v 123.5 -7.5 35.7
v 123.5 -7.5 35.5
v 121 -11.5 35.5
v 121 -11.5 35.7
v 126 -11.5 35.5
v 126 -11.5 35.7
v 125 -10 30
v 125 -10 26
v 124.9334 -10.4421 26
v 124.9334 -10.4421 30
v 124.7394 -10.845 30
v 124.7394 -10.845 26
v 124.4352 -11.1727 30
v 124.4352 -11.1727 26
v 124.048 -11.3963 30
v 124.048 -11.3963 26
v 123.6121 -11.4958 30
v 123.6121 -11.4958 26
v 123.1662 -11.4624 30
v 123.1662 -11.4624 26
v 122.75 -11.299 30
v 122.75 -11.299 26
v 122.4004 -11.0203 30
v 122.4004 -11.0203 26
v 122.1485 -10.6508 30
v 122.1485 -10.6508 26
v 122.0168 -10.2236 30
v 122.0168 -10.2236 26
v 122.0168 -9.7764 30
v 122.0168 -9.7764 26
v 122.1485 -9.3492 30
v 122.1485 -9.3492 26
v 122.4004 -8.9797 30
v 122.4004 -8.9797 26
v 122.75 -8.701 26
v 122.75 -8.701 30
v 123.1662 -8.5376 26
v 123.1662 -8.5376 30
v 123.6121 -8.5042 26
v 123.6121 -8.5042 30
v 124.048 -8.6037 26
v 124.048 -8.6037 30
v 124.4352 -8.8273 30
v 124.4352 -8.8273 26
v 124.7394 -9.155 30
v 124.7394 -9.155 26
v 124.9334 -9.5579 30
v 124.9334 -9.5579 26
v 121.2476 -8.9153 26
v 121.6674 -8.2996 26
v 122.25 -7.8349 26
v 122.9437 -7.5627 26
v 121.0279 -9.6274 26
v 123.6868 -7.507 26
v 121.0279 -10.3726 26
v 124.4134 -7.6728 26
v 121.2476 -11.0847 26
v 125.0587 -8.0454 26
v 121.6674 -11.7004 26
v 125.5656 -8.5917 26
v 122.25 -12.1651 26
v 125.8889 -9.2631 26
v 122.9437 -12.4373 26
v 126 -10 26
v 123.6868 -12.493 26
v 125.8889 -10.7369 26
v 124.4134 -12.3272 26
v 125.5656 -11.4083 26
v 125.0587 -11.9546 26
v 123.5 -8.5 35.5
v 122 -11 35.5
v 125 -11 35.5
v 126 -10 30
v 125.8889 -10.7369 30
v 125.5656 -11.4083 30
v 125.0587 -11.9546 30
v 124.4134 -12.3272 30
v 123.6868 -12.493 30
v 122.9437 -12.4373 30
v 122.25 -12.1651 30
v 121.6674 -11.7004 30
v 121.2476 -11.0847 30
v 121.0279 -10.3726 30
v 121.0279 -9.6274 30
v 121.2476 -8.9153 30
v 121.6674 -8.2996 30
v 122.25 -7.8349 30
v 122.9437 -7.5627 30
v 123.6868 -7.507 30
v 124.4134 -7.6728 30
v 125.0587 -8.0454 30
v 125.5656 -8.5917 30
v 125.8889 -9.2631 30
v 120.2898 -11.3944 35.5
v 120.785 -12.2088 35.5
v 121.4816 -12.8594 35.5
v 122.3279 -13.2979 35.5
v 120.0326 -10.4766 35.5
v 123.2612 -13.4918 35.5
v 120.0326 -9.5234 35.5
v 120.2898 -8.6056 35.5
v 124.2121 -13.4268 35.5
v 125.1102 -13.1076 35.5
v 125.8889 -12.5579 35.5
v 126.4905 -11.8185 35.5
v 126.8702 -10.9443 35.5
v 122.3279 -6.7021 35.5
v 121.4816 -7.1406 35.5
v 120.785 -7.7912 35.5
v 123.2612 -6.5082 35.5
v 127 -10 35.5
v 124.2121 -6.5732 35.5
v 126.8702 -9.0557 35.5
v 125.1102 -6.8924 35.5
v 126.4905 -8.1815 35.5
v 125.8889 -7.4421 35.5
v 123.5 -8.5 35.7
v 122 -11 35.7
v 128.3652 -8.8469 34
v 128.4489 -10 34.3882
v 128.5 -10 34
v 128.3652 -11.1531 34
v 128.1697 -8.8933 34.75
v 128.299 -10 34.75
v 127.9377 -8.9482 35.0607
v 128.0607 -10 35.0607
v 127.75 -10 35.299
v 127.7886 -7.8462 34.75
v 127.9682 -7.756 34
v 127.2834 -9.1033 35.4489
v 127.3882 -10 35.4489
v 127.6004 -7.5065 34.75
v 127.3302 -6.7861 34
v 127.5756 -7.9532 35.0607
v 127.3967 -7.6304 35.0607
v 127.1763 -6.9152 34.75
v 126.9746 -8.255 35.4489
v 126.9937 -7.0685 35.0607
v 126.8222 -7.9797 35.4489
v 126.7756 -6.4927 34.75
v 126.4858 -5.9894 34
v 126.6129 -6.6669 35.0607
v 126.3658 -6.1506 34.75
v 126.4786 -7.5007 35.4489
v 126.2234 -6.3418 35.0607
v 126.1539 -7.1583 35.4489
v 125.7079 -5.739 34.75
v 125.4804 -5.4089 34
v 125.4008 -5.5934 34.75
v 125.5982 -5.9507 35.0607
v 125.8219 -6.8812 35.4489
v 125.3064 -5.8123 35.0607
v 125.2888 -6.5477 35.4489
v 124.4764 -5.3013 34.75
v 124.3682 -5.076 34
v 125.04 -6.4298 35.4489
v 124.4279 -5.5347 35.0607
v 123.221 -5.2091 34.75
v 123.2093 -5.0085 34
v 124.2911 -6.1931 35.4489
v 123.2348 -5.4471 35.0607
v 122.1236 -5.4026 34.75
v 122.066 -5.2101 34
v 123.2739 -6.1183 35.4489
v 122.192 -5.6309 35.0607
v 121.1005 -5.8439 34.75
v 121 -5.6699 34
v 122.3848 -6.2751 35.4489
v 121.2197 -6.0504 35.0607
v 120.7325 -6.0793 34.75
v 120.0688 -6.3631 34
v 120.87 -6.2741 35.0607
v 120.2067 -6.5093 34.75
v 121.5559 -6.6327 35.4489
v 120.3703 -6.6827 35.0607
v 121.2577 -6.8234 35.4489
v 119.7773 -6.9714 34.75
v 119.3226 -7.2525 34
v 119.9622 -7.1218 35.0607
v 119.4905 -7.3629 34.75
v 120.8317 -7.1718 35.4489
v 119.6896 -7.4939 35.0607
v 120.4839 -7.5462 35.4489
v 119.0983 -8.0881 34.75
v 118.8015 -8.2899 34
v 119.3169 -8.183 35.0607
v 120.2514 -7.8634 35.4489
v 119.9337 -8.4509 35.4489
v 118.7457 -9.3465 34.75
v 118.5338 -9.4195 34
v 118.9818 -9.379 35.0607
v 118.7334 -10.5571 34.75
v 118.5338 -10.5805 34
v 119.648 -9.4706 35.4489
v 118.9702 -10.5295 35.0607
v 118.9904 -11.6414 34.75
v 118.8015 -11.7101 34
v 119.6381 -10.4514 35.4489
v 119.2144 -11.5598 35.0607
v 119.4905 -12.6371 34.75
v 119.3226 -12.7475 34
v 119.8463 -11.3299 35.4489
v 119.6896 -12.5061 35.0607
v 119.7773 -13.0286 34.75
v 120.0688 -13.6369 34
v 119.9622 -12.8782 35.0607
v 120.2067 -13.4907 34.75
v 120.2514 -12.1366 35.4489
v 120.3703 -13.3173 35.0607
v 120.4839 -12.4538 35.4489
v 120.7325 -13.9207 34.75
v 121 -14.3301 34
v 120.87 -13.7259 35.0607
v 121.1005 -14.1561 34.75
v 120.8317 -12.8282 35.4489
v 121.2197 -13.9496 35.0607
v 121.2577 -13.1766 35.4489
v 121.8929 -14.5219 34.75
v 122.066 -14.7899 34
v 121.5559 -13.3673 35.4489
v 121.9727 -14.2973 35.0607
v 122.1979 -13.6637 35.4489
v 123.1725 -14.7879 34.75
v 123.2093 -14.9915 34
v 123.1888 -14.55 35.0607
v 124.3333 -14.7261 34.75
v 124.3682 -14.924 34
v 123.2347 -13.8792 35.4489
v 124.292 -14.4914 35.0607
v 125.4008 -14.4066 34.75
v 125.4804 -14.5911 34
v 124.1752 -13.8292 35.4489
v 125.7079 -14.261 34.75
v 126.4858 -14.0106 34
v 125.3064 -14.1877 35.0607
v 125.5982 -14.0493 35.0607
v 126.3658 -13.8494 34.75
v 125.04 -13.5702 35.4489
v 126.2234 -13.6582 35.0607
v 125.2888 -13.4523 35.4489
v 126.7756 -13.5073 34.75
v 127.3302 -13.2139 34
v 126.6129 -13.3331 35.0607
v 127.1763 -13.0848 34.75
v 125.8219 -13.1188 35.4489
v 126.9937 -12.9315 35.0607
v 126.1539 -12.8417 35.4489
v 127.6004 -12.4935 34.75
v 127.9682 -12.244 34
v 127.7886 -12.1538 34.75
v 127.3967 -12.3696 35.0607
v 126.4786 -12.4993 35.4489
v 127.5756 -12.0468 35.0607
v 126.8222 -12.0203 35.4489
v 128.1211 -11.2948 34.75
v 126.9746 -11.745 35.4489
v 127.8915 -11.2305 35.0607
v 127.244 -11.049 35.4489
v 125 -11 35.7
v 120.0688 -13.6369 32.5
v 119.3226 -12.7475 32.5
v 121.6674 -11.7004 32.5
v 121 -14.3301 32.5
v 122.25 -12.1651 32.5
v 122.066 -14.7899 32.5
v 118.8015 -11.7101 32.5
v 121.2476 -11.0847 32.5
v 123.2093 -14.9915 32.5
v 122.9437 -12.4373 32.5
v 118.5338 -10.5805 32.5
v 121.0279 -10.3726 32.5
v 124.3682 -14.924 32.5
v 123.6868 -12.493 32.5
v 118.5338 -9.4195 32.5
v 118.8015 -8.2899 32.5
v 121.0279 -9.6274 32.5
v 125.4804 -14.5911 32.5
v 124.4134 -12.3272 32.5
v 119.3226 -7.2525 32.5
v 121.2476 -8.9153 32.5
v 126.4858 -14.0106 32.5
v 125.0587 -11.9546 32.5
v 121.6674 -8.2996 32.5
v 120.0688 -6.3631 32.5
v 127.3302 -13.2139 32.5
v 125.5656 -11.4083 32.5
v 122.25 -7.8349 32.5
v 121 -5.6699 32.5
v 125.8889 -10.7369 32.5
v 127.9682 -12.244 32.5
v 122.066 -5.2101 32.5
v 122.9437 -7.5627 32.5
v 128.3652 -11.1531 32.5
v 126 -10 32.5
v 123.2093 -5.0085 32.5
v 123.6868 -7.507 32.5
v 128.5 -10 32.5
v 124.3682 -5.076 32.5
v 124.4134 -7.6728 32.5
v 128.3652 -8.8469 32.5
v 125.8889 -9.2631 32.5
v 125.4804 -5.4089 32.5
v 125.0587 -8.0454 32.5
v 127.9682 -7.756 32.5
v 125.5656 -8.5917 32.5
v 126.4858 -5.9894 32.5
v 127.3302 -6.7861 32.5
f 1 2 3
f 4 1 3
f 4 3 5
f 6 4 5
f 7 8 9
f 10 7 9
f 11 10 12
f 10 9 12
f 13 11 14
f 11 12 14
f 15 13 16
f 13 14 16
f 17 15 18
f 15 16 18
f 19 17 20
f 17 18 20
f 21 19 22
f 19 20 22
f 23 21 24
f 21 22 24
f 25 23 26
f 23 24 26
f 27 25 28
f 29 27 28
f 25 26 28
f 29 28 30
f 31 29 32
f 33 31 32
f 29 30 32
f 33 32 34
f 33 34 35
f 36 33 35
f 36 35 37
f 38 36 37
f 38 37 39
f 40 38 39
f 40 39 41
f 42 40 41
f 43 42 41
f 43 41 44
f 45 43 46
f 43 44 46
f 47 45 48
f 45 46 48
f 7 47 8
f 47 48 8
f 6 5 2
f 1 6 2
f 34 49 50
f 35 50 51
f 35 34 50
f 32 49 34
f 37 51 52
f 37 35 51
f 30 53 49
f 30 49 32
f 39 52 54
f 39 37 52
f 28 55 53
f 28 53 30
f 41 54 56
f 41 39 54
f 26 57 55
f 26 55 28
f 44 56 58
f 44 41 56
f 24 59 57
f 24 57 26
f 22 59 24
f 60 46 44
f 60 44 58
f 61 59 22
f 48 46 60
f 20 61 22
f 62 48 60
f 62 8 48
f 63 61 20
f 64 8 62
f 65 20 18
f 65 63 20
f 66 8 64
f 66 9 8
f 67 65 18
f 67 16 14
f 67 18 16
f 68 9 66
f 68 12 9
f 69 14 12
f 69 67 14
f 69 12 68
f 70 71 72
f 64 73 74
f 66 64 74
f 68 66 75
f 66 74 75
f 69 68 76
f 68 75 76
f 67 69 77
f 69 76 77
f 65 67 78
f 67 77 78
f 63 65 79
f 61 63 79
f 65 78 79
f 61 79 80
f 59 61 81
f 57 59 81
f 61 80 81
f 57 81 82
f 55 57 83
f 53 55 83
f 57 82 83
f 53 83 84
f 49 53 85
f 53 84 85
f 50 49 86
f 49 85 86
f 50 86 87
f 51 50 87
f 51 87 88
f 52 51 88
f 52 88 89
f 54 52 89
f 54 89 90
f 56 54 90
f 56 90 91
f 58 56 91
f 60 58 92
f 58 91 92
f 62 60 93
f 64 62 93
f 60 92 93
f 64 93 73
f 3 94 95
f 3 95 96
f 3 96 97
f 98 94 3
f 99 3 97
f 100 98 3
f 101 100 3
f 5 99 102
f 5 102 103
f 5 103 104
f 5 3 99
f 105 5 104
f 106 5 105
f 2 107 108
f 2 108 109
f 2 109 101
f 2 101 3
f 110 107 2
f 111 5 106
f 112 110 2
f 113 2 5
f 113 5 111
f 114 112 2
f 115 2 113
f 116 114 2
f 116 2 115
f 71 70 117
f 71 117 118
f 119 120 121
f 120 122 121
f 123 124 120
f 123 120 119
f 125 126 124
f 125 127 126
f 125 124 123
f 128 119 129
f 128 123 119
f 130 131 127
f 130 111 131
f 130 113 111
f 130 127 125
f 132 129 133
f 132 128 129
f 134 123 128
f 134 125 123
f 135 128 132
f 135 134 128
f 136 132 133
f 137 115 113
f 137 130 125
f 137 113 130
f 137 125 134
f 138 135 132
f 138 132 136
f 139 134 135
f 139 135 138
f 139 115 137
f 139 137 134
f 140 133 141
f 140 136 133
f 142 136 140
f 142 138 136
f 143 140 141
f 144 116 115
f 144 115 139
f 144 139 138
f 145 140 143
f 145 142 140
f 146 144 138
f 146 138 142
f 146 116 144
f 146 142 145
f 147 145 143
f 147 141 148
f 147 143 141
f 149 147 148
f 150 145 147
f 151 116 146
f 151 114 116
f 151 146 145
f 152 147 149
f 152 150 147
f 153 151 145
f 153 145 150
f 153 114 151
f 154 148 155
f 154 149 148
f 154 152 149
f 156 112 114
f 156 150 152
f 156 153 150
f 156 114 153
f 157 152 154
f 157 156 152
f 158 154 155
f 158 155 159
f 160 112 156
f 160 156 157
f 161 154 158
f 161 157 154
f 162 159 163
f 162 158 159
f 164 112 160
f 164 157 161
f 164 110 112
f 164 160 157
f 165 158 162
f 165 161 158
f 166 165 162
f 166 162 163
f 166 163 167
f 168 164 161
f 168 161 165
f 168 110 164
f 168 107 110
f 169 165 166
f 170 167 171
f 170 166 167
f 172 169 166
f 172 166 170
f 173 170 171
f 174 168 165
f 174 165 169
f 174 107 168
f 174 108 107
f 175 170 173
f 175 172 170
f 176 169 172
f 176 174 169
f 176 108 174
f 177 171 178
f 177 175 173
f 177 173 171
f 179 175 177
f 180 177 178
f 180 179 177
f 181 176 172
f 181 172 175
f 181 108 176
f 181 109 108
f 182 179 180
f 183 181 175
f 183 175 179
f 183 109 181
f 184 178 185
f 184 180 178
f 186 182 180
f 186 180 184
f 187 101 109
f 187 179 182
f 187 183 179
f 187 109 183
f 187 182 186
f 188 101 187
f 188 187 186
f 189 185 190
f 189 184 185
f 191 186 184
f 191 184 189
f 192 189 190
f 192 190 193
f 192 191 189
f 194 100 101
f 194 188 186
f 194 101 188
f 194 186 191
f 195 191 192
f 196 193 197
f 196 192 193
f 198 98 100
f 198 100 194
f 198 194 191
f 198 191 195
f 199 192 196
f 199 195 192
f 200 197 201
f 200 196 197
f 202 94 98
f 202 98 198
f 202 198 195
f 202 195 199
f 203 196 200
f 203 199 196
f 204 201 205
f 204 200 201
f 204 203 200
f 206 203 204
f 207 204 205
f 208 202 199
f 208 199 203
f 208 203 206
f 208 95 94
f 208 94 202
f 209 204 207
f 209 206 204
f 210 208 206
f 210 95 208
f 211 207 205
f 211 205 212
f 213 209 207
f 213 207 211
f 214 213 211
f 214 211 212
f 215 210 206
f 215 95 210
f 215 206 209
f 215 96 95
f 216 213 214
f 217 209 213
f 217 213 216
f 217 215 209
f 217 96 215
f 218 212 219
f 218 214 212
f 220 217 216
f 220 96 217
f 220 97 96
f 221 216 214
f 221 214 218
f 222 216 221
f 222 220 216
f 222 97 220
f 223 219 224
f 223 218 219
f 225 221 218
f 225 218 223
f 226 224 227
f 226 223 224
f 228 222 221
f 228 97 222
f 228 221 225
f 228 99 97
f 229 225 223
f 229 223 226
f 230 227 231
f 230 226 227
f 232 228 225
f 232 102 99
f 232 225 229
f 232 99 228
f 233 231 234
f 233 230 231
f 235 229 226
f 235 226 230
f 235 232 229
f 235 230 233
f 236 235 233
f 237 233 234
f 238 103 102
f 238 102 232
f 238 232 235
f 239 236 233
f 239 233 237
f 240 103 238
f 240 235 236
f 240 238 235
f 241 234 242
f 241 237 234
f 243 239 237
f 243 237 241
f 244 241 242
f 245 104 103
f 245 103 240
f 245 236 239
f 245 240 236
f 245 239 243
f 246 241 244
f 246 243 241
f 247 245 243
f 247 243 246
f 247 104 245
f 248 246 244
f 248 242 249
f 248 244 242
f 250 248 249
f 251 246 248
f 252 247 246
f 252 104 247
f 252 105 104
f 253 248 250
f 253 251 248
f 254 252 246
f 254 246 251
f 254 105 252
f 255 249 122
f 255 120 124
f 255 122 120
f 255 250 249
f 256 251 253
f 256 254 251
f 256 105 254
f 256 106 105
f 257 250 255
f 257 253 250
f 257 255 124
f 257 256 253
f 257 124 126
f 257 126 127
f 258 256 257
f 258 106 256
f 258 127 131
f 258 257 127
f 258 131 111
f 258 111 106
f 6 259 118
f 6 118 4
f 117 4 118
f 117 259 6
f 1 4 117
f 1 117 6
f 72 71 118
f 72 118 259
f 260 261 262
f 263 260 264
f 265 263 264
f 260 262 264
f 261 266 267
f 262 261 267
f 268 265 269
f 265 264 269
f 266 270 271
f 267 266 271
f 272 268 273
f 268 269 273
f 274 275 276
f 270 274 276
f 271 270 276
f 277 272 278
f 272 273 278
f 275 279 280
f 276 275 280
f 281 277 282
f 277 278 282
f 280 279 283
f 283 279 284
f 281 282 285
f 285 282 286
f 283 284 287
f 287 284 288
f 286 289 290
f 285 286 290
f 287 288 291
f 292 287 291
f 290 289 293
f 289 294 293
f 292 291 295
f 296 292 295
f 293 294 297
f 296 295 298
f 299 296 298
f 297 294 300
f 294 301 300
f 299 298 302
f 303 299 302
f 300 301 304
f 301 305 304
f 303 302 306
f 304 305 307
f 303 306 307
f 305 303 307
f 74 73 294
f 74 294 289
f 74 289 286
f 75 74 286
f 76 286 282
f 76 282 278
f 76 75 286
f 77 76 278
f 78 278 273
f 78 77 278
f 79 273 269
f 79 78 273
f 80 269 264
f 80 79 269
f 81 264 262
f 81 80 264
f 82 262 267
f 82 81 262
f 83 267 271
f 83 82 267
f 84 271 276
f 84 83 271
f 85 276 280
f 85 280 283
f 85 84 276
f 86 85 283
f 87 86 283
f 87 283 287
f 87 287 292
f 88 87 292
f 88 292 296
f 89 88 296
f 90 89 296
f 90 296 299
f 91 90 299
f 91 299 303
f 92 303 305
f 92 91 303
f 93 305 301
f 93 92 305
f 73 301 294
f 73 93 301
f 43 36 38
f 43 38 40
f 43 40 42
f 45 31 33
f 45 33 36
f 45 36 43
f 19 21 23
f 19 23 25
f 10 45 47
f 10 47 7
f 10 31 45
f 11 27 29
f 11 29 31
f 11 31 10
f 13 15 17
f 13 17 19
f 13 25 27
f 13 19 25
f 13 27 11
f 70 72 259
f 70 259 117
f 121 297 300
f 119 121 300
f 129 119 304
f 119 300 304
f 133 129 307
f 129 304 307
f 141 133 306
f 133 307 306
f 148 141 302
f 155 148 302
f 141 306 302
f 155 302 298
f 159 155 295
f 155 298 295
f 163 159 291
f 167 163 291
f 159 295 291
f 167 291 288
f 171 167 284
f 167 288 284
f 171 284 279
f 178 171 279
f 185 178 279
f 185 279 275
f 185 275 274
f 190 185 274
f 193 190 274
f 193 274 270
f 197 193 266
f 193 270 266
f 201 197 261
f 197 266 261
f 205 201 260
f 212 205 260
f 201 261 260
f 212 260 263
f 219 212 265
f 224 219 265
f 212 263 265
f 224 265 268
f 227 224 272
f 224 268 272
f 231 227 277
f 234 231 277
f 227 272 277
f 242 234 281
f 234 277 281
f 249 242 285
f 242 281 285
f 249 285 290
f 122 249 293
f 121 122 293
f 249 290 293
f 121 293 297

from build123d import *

# Parameters (mm, degrees)
SKETCH046_R     = 2.5
PAD023_DEPTH    = 2.5
SKETCH047_R     = 5
PAD024_DEPTH    = 3
FILLET003_R     = 1.5
SKETCH049_R     = 2.5
PAD025_DEPTH    = 4
SKETCH050_R     = 1.5
POCKET026_DEPTH = 4
PAD056_DEPTH    = 0.2


with BuildPart() as part:
    # Sketch046 → Pad023 (new body)
    with BuildSketch(Plane(origin=(0, 0, 30), x_dir=(1, 0, 0), z_dir=(0, 0, -1))):
        with Locations((101, 55)):
            Circle(SKETCH046_R)
    extrude(amount=-PAD023_DEPTH)

    # Sketch047 (on Face3 of Pad023) → Pad024 (join)
    with BuildSketch(Plane.XY.offset(32.5)):
        with Locations((101, -55)):
            Circle(SKETCH047_R)
    extrude(amount=PAD024_DEPTH)

    # Fillet003
    fillet003_edges = [part.edges().sort_by_distance(p)[0] for p in [
        (96, -55, 35.5),
    ]]
    fillet(fillet003_edges, radius=FILLET003_R)

    # Sketch049 → Pad025 (join)
    with BuildSketch(Plane(origin=(0, 0, 30), x_dir=(1, 0, 0), z_dir=(0, 0, -1))):
        with Locations((101, 55)):
            Circle(SKETCH049_R)
    extrude(amount=PAD025_DEPTH)

    # Sketch050 (on Face17 of Pad025) → Pocket026 (cut)
    with BuildSketch(Plane(origin=(0, 0, 26), x_dir=(1, 0, 0), z_dir=(0, 0, -1))):
        with Locations((101, 55)):
            Circle(SKETCH050_R)
    extrude(amount=-POCKET026_DEPTH, mode=Mode.SUBTRACT)


with BuildPart() as part_1:
    # Body002 placement: moved
    add(part.part.moved(Location((75, 0, 0))))

    # Sketch090 (on Face4 of Clone004) → Pad056 (new body)
    with BuildSketch(Plane(origin=(75, 0, 35.5), x_dir=(1, 0, 0), z_dir=(0, 0, 1))):
        Polygon((98.5, -56.5), (103.5, -56.5), (101, -52.5), align=None)
        Polygon((101, -53.5), (99.5, -56), (102.5, -56), align=None, mode=Mode.SUBTRACT)
    extrude(amount=PAD056_DEPTH)


with BuildPart() as part_2:
    # Body013 placement: moved
    add(part_1.part.moved(Location((-52.5, 45, 0))))


solid = part_2.part
